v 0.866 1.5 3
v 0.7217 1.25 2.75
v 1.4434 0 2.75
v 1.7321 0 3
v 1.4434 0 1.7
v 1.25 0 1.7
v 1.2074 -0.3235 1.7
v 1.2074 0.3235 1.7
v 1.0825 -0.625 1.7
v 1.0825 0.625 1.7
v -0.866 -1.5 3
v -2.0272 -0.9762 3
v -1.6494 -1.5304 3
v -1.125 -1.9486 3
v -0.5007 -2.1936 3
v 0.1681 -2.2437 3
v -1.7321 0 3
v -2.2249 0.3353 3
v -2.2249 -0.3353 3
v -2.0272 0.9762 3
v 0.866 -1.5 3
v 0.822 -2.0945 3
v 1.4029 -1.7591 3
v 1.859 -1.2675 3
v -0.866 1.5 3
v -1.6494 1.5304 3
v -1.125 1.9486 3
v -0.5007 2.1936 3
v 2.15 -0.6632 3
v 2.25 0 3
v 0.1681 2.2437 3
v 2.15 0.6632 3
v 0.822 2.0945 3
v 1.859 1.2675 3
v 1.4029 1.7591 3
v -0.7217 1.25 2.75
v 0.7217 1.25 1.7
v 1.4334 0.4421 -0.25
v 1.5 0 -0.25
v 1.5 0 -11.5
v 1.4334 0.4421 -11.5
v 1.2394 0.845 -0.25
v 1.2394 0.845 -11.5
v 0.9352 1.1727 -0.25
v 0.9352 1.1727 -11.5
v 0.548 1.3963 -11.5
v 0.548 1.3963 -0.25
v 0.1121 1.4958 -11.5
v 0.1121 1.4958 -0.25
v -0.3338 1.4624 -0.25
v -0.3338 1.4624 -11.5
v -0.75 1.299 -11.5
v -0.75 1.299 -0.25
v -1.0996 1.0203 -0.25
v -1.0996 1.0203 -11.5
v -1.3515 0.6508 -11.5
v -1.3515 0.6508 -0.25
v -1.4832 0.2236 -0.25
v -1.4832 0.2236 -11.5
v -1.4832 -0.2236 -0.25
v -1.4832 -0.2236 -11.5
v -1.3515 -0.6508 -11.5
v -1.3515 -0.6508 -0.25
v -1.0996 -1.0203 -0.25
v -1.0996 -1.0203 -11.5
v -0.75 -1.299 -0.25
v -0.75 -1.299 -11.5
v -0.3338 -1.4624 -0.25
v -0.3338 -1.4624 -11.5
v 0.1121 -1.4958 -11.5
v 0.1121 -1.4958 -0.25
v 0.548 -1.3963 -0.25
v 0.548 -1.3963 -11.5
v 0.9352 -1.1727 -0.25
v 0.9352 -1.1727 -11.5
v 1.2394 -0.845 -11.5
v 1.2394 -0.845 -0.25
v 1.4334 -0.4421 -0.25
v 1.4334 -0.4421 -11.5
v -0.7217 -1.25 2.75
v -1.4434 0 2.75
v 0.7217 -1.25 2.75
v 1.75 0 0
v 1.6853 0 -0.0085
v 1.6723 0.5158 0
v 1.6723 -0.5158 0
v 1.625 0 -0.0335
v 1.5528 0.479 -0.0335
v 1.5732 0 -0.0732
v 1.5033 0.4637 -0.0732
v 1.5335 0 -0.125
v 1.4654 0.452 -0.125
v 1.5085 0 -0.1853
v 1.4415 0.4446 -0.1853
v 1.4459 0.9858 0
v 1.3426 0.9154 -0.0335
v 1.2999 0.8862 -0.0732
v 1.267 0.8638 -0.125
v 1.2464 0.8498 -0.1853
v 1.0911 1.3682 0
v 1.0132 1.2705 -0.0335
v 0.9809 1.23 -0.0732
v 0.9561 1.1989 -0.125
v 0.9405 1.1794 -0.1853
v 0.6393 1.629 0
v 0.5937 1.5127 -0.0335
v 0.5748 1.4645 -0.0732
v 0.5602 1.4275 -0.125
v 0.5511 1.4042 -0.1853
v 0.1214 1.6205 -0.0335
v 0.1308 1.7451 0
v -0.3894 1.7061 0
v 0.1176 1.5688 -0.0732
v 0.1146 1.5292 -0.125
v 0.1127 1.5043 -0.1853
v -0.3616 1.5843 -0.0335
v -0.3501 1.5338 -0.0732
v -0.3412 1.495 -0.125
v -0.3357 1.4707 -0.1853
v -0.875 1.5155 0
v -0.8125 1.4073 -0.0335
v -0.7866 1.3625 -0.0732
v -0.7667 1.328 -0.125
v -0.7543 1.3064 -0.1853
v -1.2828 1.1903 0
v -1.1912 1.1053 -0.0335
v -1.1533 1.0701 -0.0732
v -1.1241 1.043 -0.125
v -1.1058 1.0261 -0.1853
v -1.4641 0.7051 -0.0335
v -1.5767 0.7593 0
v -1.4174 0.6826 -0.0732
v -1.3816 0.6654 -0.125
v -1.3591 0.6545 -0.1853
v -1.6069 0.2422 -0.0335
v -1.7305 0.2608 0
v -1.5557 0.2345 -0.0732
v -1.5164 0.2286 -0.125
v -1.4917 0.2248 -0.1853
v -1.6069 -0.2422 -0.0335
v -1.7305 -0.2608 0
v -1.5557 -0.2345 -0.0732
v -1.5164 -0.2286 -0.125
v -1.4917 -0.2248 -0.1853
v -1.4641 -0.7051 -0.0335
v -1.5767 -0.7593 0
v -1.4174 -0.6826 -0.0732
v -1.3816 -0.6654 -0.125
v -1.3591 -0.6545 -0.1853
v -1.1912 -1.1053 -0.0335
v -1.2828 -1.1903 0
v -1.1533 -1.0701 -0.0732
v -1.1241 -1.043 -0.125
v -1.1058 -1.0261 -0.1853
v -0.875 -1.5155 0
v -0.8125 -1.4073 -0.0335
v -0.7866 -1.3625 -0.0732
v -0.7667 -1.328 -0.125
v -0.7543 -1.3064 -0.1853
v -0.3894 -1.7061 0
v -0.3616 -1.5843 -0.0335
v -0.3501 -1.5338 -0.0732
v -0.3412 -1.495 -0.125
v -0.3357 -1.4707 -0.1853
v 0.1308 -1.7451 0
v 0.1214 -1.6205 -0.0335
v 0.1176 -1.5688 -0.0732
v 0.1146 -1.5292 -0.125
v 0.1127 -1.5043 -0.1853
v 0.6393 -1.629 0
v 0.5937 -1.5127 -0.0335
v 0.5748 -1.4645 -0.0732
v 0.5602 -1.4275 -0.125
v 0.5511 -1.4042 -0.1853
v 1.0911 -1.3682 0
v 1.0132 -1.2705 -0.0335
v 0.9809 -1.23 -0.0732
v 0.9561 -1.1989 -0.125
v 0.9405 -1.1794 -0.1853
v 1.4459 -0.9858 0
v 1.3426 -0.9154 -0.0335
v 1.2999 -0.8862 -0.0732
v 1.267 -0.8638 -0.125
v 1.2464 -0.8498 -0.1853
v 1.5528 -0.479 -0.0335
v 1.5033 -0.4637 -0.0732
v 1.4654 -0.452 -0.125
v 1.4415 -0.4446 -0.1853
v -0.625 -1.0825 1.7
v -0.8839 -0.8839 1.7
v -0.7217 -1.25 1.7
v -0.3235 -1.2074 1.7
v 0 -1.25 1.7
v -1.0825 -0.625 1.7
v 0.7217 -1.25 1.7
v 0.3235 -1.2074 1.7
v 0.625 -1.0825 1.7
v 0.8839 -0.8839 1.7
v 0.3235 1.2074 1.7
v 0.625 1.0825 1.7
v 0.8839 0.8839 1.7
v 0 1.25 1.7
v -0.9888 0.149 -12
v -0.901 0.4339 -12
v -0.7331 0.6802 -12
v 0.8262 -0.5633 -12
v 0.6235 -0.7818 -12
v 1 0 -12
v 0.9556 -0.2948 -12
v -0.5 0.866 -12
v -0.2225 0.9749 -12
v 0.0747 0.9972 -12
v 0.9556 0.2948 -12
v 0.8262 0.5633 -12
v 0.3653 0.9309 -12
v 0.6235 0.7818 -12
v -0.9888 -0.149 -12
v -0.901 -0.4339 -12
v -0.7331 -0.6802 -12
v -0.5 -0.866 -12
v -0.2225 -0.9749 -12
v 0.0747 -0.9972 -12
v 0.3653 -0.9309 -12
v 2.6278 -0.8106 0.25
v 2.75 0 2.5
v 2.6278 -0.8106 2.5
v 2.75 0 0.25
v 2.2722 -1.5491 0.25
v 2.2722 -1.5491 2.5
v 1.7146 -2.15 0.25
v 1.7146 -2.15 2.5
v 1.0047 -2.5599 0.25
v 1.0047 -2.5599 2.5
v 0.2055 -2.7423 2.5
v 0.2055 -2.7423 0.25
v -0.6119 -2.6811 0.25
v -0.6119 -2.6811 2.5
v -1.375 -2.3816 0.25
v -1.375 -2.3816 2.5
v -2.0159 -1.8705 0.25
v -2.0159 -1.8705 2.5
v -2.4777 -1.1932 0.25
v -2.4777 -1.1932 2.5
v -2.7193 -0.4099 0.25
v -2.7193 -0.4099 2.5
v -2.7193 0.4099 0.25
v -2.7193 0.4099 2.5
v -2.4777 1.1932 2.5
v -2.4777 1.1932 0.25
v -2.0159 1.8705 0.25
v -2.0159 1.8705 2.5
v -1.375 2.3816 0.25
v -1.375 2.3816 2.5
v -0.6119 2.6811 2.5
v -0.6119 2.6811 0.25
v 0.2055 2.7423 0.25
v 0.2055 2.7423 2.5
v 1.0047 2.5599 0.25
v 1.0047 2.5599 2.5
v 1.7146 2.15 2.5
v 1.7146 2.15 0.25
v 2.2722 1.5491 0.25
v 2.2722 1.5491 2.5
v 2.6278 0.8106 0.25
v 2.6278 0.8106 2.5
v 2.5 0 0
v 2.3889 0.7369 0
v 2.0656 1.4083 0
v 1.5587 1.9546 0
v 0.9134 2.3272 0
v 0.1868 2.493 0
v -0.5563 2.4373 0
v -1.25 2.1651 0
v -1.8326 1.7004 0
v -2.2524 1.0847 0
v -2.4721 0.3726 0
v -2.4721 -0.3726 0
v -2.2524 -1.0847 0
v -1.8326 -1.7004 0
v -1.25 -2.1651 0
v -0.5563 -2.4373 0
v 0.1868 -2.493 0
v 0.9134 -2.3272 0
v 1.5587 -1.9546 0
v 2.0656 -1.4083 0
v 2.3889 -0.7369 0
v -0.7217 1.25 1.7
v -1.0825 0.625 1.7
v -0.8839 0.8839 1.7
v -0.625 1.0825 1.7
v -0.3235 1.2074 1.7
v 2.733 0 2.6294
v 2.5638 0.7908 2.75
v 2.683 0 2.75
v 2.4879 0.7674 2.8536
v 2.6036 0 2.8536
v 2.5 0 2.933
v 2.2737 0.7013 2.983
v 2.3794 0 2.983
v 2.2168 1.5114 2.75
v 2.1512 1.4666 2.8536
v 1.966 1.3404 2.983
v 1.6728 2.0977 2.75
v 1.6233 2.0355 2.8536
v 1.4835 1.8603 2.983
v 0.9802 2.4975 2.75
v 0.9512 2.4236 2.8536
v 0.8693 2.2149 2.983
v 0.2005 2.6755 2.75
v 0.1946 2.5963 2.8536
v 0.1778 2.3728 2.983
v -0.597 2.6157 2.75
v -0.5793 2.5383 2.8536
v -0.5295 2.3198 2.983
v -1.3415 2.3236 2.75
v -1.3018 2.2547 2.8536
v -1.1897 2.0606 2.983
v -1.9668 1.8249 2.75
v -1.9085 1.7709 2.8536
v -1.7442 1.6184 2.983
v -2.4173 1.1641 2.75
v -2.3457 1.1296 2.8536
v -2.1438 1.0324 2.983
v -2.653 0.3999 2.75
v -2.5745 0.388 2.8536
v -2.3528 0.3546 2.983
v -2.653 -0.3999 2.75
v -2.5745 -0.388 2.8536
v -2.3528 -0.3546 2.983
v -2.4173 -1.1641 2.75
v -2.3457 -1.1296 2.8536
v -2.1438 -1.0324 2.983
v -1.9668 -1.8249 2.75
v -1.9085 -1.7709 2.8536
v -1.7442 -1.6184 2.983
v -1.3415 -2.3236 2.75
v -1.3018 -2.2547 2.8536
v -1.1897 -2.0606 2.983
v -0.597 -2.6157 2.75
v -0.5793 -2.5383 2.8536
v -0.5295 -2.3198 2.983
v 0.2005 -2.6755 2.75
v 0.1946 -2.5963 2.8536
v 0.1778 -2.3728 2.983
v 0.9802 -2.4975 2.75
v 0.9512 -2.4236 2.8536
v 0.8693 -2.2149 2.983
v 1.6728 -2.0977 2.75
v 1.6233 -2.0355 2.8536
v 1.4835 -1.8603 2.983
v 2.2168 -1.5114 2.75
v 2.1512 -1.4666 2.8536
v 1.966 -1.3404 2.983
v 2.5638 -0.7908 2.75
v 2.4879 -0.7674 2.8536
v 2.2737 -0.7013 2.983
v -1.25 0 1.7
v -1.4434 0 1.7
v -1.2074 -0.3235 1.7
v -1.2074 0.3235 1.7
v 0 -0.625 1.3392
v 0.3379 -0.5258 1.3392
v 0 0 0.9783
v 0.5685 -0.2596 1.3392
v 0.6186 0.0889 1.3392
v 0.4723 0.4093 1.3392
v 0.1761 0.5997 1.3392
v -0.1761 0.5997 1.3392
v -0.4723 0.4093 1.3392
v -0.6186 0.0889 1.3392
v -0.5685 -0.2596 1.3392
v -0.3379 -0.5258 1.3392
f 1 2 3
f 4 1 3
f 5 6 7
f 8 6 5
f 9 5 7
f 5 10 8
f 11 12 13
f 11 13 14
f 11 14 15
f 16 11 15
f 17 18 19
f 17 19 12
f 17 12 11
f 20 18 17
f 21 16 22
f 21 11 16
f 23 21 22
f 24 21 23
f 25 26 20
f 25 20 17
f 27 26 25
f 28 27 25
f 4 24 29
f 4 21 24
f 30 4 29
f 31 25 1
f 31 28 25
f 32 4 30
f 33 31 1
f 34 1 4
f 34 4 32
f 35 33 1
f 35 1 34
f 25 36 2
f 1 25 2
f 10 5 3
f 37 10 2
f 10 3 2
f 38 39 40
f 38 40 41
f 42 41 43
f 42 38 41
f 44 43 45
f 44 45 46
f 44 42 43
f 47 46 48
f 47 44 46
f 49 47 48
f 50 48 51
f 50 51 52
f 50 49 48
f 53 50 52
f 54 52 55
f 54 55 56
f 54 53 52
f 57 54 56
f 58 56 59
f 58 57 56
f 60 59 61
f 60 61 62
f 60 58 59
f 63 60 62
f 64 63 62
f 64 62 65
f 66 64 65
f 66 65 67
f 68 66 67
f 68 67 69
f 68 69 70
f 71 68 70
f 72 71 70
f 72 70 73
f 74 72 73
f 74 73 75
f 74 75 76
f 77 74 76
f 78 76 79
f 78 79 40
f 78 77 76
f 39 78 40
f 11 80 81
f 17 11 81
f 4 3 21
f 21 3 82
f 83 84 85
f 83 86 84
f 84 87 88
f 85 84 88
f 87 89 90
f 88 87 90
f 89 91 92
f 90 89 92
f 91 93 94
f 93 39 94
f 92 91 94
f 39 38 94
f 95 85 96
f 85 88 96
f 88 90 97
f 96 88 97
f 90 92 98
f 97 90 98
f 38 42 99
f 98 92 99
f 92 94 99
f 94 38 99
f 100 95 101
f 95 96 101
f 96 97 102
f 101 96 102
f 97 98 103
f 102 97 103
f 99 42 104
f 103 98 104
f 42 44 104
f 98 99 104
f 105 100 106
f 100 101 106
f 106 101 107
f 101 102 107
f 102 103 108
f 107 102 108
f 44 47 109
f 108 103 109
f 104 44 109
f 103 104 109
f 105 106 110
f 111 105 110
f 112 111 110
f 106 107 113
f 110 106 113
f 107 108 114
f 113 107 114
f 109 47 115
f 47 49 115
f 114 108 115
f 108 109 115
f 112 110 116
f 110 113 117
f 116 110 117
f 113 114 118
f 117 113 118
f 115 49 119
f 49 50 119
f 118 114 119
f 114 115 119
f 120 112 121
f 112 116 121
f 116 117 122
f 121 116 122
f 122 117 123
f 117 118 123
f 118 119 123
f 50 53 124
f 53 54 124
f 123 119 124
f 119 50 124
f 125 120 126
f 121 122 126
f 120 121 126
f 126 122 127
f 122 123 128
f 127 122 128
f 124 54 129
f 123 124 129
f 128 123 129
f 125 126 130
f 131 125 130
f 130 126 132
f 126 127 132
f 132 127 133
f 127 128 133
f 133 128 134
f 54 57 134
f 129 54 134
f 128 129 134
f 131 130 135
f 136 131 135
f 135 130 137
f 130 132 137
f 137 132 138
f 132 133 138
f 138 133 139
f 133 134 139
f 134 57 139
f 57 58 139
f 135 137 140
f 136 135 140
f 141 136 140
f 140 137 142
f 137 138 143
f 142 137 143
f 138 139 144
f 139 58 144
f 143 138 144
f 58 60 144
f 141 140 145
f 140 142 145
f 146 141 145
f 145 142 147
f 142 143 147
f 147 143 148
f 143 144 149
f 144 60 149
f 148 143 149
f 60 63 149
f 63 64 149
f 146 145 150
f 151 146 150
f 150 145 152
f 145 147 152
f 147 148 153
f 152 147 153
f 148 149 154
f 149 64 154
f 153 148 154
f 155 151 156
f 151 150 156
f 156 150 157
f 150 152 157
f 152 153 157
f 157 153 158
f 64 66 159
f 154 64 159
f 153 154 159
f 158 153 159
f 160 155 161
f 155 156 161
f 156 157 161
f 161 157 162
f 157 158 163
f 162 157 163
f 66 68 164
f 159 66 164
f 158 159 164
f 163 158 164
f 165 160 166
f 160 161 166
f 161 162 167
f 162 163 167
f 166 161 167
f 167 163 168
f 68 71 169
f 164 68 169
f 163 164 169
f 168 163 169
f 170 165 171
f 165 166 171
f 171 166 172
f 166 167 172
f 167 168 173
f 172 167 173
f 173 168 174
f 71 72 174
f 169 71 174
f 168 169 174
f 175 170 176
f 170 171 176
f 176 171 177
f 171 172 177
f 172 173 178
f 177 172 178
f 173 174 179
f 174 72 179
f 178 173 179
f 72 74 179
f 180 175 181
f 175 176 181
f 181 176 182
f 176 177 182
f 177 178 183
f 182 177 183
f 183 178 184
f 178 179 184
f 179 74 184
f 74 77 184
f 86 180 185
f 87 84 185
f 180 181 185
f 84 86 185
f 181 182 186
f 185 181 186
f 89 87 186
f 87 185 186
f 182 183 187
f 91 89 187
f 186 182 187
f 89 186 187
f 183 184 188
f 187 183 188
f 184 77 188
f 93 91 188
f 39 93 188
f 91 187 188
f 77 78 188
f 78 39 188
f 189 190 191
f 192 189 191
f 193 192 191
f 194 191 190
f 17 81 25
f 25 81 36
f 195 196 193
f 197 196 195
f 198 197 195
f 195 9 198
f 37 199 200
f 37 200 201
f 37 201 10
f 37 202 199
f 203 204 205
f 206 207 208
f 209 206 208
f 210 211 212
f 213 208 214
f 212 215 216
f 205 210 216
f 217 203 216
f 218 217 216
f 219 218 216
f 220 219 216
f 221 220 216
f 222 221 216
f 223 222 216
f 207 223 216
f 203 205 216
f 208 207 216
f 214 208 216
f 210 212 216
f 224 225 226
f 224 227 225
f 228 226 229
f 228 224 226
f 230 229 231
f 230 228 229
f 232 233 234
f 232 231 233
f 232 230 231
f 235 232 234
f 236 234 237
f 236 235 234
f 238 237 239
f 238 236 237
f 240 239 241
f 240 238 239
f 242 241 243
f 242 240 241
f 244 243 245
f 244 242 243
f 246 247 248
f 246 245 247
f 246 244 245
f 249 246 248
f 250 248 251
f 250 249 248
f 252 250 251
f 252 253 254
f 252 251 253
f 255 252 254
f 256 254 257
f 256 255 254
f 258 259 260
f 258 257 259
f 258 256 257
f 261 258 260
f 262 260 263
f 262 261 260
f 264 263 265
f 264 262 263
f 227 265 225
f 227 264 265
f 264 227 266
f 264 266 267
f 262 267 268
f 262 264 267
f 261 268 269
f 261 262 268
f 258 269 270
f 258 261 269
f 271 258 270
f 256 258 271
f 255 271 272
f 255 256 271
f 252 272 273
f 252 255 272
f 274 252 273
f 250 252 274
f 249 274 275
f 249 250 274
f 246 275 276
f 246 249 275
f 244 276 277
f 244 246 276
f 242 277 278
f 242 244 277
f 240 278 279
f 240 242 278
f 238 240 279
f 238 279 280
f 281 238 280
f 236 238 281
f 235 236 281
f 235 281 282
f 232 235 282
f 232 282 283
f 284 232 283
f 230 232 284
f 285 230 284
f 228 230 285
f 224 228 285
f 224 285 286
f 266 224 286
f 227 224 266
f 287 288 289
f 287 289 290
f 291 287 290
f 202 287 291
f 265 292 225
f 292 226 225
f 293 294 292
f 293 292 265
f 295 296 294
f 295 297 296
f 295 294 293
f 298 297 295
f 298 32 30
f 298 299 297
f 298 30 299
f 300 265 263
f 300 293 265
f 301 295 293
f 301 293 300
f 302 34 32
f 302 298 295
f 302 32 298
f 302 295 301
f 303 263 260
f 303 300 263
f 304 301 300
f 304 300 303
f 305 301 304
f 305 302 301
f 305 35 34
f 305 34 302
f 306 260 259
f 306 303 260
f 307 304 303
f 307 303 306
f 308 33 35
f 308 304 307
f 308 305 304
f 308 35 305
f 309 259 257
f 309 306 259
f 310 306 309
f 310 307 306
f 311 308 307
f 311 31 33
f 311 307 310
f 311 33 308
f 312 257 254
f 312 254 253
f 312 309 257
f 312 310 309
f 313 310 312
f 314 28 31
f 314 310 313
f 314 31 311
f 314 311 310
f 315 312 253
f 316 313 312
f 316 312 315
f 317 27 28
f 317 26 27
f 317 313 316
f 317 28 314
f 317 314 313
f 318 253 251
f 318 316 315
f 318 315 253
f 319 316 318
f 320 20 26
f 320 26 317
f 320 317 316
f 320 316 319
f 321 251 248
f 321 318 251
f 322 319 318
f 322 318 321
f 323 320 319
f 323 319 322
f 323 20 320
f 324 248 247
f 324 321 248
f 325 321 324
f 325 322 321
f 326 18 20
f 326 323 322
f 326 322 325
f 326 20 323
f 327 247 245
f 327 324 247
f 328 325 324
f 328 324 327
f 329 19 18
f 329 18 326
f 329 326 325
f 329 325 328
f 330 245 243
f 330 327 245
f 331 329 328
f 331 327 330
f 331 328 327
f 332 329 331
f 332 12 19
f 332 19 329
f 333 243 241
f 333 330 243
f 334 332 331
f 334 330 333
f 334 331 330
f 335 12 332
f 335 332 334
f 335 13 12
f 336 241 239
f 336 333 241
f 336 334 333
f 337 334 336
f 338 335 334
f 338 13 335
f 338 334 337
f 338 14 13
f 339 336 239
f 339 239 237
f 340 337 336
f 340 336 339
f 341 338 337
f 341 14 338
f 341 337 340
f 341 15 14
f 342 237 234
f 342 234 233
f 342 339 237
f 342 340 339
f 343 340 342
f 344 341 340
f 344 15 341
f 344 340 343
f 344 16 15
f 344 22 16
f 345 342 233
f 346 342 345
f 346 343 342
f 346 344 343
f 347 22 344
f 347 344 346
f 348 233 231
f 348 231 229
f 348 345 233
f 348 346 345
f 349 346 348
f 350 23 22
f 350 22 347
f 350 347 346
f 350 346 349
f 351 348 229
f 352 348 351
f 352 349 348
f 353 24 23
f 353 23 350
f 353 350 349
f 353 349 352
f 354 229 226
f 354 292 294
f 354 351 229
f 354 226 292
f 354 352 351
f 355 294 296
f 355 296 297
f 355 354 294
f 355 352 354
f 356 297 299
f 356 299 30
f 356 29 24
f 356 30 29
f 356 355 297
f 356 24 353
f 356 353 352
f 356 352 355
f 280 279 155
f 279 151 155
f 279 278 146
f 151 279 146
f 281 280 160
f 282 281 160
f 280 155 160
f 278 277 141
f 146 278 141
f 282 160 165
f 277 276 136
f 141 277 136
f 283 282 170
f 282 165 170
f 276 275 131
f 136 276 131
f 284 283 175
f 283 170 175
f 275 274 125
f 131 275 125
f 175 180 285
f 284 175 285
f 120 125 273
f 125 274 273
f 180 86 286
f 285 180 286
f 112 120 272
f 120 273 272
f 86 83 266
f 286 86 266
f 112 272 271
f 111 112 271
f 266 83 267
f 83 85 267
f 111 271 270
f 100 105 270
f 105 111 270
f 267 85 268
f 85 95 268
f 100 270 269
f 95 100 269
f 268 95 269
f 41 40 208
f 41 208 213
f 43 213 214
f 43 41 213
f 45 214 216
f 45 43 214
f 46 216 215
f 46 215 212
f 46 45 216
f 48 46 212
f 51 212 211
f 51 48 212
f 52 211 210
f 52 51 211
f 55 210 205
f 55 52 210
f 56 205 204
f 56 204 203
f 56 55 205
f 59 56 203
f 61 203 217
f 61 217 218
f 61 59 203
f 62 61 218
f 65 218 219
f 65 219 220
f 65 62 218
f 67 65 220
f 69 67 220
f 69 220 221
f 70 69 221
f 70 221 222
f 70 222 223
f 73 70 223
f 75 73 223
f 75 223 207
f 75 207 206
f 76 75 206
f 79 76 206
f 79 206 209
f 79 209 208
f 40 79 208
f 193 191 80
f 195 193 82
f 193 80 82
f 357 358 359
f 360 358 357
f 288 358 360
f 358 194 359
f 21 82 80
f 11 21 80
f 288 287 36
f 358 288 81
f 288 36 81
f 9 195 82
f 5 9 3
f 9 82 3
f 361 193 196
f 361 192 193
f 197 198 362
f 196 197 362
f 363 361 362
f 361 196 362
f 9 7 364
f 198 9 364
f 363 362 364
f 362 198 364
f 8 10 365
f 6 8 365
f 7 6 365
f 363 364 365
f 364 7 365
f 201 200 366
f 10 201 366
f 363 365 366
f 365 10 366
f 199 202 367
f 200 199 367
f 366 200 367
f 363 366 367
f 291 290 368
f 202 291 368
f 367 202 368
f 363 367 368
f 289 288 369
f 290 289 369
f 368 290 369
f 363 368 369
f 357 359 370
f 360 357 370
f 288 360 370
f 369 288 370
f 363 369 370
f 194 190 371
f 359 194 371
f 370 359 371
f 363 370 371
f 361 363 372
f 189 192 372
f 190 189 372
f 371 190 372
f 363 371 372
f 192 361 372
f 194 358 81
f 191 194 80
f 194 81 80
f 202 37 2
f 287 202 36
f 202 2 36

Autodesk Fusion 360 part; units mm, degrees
sketch "Sketch1" plane through (0, 0, 0) normal (0, 0, 1) x (1, 0, 0)
  circle A0 centre (0, 0) radius 2.75
  line L0 (-0.7217, 1.25) -> (-1.4434, 0)
  line L1 (-1.4434, 0) -> (-0.7217, -1.25)
  line L2 (-0.7217, -1.25) -> (0.7217, -1.25)
  line L3 (0.7217, -1.25) -> (1.4434, 0)
  line L4 (1.4434, 0) -> (0.7217, 1.25)
  line L5 (0.7217, 1.25) -> (-0.7217, 1.25)
  circle A1 centre (0, 0) radius 1.5
  dimension "d5" = 5.5
  dimension "d6" = 1.25
  dimension "d12" = 3
extrude "Extrude1" add sketch "Sketch1" along normal blind 3 contours A0 | L0 L1 L2 L3 L4 L5 | A1
extrude "Extrude2" add sketch "Sketch1" along normal blind 0.75 contours L0 L1 L2 L3 L4 L5
hole "Hole1" at (0, 0, 3) direction (0, 0, -1) diameter 2.5 depth 1.3 tip angle 120
extrude "Extrude3" add sketch "Sketch1" against normal blind 12 contours L0 L1 L2 L3 L4 L5 | A1
extrude "Extrude4" cut sketch "Sketch1" against normal blind 1.3 from surface at 3 contours L0 L1 L2 L3 L4 L5
fillet "Fillet1" radius 0.5 1 edges at (-2.5639, -0.9944, 3)
fillet "Fillet2" radius 0.25 1 edges at (-1.3985, -0.5424, 0)
chamfer "Chamfer1" distance 0.25 angle 45 7 edges at (-1.0825, 0.625, 3) (-1.0825, -0.625, 3) (0, -1.25, 3) (1.0825, -0.625, 3) (1.0825, 0.625, 3) (0, 1.25, 3) (-2.5639, -0.9944, 0)
chamfer "Chamfer2" distance 0.5 angle 45 1 edges at (-1.3985, 0.5424, -12)
thread "Thread1"
equation "Thread_Size = 3 mm"
equation "Thread_Length = 12 mm"
equation "Head_Diameter = 5.5 mm"
equation "Hex_Width = 2.5 mm"
equation "d5 = Head_Diameter"
equation "d6 = Hex_Width / 2"
equation "Head_Height = 3 mm"
equation "d8 = Head_Height"
equation "d10 = Head_Height * 0.25"
equation "d12 = Thread_Size"
equation "d19 = Hex_Depth"
equation "d20 = Hex_Width"
equation "Hex_Depth = 1.3 mm"
properties part number "HW1292SC"
